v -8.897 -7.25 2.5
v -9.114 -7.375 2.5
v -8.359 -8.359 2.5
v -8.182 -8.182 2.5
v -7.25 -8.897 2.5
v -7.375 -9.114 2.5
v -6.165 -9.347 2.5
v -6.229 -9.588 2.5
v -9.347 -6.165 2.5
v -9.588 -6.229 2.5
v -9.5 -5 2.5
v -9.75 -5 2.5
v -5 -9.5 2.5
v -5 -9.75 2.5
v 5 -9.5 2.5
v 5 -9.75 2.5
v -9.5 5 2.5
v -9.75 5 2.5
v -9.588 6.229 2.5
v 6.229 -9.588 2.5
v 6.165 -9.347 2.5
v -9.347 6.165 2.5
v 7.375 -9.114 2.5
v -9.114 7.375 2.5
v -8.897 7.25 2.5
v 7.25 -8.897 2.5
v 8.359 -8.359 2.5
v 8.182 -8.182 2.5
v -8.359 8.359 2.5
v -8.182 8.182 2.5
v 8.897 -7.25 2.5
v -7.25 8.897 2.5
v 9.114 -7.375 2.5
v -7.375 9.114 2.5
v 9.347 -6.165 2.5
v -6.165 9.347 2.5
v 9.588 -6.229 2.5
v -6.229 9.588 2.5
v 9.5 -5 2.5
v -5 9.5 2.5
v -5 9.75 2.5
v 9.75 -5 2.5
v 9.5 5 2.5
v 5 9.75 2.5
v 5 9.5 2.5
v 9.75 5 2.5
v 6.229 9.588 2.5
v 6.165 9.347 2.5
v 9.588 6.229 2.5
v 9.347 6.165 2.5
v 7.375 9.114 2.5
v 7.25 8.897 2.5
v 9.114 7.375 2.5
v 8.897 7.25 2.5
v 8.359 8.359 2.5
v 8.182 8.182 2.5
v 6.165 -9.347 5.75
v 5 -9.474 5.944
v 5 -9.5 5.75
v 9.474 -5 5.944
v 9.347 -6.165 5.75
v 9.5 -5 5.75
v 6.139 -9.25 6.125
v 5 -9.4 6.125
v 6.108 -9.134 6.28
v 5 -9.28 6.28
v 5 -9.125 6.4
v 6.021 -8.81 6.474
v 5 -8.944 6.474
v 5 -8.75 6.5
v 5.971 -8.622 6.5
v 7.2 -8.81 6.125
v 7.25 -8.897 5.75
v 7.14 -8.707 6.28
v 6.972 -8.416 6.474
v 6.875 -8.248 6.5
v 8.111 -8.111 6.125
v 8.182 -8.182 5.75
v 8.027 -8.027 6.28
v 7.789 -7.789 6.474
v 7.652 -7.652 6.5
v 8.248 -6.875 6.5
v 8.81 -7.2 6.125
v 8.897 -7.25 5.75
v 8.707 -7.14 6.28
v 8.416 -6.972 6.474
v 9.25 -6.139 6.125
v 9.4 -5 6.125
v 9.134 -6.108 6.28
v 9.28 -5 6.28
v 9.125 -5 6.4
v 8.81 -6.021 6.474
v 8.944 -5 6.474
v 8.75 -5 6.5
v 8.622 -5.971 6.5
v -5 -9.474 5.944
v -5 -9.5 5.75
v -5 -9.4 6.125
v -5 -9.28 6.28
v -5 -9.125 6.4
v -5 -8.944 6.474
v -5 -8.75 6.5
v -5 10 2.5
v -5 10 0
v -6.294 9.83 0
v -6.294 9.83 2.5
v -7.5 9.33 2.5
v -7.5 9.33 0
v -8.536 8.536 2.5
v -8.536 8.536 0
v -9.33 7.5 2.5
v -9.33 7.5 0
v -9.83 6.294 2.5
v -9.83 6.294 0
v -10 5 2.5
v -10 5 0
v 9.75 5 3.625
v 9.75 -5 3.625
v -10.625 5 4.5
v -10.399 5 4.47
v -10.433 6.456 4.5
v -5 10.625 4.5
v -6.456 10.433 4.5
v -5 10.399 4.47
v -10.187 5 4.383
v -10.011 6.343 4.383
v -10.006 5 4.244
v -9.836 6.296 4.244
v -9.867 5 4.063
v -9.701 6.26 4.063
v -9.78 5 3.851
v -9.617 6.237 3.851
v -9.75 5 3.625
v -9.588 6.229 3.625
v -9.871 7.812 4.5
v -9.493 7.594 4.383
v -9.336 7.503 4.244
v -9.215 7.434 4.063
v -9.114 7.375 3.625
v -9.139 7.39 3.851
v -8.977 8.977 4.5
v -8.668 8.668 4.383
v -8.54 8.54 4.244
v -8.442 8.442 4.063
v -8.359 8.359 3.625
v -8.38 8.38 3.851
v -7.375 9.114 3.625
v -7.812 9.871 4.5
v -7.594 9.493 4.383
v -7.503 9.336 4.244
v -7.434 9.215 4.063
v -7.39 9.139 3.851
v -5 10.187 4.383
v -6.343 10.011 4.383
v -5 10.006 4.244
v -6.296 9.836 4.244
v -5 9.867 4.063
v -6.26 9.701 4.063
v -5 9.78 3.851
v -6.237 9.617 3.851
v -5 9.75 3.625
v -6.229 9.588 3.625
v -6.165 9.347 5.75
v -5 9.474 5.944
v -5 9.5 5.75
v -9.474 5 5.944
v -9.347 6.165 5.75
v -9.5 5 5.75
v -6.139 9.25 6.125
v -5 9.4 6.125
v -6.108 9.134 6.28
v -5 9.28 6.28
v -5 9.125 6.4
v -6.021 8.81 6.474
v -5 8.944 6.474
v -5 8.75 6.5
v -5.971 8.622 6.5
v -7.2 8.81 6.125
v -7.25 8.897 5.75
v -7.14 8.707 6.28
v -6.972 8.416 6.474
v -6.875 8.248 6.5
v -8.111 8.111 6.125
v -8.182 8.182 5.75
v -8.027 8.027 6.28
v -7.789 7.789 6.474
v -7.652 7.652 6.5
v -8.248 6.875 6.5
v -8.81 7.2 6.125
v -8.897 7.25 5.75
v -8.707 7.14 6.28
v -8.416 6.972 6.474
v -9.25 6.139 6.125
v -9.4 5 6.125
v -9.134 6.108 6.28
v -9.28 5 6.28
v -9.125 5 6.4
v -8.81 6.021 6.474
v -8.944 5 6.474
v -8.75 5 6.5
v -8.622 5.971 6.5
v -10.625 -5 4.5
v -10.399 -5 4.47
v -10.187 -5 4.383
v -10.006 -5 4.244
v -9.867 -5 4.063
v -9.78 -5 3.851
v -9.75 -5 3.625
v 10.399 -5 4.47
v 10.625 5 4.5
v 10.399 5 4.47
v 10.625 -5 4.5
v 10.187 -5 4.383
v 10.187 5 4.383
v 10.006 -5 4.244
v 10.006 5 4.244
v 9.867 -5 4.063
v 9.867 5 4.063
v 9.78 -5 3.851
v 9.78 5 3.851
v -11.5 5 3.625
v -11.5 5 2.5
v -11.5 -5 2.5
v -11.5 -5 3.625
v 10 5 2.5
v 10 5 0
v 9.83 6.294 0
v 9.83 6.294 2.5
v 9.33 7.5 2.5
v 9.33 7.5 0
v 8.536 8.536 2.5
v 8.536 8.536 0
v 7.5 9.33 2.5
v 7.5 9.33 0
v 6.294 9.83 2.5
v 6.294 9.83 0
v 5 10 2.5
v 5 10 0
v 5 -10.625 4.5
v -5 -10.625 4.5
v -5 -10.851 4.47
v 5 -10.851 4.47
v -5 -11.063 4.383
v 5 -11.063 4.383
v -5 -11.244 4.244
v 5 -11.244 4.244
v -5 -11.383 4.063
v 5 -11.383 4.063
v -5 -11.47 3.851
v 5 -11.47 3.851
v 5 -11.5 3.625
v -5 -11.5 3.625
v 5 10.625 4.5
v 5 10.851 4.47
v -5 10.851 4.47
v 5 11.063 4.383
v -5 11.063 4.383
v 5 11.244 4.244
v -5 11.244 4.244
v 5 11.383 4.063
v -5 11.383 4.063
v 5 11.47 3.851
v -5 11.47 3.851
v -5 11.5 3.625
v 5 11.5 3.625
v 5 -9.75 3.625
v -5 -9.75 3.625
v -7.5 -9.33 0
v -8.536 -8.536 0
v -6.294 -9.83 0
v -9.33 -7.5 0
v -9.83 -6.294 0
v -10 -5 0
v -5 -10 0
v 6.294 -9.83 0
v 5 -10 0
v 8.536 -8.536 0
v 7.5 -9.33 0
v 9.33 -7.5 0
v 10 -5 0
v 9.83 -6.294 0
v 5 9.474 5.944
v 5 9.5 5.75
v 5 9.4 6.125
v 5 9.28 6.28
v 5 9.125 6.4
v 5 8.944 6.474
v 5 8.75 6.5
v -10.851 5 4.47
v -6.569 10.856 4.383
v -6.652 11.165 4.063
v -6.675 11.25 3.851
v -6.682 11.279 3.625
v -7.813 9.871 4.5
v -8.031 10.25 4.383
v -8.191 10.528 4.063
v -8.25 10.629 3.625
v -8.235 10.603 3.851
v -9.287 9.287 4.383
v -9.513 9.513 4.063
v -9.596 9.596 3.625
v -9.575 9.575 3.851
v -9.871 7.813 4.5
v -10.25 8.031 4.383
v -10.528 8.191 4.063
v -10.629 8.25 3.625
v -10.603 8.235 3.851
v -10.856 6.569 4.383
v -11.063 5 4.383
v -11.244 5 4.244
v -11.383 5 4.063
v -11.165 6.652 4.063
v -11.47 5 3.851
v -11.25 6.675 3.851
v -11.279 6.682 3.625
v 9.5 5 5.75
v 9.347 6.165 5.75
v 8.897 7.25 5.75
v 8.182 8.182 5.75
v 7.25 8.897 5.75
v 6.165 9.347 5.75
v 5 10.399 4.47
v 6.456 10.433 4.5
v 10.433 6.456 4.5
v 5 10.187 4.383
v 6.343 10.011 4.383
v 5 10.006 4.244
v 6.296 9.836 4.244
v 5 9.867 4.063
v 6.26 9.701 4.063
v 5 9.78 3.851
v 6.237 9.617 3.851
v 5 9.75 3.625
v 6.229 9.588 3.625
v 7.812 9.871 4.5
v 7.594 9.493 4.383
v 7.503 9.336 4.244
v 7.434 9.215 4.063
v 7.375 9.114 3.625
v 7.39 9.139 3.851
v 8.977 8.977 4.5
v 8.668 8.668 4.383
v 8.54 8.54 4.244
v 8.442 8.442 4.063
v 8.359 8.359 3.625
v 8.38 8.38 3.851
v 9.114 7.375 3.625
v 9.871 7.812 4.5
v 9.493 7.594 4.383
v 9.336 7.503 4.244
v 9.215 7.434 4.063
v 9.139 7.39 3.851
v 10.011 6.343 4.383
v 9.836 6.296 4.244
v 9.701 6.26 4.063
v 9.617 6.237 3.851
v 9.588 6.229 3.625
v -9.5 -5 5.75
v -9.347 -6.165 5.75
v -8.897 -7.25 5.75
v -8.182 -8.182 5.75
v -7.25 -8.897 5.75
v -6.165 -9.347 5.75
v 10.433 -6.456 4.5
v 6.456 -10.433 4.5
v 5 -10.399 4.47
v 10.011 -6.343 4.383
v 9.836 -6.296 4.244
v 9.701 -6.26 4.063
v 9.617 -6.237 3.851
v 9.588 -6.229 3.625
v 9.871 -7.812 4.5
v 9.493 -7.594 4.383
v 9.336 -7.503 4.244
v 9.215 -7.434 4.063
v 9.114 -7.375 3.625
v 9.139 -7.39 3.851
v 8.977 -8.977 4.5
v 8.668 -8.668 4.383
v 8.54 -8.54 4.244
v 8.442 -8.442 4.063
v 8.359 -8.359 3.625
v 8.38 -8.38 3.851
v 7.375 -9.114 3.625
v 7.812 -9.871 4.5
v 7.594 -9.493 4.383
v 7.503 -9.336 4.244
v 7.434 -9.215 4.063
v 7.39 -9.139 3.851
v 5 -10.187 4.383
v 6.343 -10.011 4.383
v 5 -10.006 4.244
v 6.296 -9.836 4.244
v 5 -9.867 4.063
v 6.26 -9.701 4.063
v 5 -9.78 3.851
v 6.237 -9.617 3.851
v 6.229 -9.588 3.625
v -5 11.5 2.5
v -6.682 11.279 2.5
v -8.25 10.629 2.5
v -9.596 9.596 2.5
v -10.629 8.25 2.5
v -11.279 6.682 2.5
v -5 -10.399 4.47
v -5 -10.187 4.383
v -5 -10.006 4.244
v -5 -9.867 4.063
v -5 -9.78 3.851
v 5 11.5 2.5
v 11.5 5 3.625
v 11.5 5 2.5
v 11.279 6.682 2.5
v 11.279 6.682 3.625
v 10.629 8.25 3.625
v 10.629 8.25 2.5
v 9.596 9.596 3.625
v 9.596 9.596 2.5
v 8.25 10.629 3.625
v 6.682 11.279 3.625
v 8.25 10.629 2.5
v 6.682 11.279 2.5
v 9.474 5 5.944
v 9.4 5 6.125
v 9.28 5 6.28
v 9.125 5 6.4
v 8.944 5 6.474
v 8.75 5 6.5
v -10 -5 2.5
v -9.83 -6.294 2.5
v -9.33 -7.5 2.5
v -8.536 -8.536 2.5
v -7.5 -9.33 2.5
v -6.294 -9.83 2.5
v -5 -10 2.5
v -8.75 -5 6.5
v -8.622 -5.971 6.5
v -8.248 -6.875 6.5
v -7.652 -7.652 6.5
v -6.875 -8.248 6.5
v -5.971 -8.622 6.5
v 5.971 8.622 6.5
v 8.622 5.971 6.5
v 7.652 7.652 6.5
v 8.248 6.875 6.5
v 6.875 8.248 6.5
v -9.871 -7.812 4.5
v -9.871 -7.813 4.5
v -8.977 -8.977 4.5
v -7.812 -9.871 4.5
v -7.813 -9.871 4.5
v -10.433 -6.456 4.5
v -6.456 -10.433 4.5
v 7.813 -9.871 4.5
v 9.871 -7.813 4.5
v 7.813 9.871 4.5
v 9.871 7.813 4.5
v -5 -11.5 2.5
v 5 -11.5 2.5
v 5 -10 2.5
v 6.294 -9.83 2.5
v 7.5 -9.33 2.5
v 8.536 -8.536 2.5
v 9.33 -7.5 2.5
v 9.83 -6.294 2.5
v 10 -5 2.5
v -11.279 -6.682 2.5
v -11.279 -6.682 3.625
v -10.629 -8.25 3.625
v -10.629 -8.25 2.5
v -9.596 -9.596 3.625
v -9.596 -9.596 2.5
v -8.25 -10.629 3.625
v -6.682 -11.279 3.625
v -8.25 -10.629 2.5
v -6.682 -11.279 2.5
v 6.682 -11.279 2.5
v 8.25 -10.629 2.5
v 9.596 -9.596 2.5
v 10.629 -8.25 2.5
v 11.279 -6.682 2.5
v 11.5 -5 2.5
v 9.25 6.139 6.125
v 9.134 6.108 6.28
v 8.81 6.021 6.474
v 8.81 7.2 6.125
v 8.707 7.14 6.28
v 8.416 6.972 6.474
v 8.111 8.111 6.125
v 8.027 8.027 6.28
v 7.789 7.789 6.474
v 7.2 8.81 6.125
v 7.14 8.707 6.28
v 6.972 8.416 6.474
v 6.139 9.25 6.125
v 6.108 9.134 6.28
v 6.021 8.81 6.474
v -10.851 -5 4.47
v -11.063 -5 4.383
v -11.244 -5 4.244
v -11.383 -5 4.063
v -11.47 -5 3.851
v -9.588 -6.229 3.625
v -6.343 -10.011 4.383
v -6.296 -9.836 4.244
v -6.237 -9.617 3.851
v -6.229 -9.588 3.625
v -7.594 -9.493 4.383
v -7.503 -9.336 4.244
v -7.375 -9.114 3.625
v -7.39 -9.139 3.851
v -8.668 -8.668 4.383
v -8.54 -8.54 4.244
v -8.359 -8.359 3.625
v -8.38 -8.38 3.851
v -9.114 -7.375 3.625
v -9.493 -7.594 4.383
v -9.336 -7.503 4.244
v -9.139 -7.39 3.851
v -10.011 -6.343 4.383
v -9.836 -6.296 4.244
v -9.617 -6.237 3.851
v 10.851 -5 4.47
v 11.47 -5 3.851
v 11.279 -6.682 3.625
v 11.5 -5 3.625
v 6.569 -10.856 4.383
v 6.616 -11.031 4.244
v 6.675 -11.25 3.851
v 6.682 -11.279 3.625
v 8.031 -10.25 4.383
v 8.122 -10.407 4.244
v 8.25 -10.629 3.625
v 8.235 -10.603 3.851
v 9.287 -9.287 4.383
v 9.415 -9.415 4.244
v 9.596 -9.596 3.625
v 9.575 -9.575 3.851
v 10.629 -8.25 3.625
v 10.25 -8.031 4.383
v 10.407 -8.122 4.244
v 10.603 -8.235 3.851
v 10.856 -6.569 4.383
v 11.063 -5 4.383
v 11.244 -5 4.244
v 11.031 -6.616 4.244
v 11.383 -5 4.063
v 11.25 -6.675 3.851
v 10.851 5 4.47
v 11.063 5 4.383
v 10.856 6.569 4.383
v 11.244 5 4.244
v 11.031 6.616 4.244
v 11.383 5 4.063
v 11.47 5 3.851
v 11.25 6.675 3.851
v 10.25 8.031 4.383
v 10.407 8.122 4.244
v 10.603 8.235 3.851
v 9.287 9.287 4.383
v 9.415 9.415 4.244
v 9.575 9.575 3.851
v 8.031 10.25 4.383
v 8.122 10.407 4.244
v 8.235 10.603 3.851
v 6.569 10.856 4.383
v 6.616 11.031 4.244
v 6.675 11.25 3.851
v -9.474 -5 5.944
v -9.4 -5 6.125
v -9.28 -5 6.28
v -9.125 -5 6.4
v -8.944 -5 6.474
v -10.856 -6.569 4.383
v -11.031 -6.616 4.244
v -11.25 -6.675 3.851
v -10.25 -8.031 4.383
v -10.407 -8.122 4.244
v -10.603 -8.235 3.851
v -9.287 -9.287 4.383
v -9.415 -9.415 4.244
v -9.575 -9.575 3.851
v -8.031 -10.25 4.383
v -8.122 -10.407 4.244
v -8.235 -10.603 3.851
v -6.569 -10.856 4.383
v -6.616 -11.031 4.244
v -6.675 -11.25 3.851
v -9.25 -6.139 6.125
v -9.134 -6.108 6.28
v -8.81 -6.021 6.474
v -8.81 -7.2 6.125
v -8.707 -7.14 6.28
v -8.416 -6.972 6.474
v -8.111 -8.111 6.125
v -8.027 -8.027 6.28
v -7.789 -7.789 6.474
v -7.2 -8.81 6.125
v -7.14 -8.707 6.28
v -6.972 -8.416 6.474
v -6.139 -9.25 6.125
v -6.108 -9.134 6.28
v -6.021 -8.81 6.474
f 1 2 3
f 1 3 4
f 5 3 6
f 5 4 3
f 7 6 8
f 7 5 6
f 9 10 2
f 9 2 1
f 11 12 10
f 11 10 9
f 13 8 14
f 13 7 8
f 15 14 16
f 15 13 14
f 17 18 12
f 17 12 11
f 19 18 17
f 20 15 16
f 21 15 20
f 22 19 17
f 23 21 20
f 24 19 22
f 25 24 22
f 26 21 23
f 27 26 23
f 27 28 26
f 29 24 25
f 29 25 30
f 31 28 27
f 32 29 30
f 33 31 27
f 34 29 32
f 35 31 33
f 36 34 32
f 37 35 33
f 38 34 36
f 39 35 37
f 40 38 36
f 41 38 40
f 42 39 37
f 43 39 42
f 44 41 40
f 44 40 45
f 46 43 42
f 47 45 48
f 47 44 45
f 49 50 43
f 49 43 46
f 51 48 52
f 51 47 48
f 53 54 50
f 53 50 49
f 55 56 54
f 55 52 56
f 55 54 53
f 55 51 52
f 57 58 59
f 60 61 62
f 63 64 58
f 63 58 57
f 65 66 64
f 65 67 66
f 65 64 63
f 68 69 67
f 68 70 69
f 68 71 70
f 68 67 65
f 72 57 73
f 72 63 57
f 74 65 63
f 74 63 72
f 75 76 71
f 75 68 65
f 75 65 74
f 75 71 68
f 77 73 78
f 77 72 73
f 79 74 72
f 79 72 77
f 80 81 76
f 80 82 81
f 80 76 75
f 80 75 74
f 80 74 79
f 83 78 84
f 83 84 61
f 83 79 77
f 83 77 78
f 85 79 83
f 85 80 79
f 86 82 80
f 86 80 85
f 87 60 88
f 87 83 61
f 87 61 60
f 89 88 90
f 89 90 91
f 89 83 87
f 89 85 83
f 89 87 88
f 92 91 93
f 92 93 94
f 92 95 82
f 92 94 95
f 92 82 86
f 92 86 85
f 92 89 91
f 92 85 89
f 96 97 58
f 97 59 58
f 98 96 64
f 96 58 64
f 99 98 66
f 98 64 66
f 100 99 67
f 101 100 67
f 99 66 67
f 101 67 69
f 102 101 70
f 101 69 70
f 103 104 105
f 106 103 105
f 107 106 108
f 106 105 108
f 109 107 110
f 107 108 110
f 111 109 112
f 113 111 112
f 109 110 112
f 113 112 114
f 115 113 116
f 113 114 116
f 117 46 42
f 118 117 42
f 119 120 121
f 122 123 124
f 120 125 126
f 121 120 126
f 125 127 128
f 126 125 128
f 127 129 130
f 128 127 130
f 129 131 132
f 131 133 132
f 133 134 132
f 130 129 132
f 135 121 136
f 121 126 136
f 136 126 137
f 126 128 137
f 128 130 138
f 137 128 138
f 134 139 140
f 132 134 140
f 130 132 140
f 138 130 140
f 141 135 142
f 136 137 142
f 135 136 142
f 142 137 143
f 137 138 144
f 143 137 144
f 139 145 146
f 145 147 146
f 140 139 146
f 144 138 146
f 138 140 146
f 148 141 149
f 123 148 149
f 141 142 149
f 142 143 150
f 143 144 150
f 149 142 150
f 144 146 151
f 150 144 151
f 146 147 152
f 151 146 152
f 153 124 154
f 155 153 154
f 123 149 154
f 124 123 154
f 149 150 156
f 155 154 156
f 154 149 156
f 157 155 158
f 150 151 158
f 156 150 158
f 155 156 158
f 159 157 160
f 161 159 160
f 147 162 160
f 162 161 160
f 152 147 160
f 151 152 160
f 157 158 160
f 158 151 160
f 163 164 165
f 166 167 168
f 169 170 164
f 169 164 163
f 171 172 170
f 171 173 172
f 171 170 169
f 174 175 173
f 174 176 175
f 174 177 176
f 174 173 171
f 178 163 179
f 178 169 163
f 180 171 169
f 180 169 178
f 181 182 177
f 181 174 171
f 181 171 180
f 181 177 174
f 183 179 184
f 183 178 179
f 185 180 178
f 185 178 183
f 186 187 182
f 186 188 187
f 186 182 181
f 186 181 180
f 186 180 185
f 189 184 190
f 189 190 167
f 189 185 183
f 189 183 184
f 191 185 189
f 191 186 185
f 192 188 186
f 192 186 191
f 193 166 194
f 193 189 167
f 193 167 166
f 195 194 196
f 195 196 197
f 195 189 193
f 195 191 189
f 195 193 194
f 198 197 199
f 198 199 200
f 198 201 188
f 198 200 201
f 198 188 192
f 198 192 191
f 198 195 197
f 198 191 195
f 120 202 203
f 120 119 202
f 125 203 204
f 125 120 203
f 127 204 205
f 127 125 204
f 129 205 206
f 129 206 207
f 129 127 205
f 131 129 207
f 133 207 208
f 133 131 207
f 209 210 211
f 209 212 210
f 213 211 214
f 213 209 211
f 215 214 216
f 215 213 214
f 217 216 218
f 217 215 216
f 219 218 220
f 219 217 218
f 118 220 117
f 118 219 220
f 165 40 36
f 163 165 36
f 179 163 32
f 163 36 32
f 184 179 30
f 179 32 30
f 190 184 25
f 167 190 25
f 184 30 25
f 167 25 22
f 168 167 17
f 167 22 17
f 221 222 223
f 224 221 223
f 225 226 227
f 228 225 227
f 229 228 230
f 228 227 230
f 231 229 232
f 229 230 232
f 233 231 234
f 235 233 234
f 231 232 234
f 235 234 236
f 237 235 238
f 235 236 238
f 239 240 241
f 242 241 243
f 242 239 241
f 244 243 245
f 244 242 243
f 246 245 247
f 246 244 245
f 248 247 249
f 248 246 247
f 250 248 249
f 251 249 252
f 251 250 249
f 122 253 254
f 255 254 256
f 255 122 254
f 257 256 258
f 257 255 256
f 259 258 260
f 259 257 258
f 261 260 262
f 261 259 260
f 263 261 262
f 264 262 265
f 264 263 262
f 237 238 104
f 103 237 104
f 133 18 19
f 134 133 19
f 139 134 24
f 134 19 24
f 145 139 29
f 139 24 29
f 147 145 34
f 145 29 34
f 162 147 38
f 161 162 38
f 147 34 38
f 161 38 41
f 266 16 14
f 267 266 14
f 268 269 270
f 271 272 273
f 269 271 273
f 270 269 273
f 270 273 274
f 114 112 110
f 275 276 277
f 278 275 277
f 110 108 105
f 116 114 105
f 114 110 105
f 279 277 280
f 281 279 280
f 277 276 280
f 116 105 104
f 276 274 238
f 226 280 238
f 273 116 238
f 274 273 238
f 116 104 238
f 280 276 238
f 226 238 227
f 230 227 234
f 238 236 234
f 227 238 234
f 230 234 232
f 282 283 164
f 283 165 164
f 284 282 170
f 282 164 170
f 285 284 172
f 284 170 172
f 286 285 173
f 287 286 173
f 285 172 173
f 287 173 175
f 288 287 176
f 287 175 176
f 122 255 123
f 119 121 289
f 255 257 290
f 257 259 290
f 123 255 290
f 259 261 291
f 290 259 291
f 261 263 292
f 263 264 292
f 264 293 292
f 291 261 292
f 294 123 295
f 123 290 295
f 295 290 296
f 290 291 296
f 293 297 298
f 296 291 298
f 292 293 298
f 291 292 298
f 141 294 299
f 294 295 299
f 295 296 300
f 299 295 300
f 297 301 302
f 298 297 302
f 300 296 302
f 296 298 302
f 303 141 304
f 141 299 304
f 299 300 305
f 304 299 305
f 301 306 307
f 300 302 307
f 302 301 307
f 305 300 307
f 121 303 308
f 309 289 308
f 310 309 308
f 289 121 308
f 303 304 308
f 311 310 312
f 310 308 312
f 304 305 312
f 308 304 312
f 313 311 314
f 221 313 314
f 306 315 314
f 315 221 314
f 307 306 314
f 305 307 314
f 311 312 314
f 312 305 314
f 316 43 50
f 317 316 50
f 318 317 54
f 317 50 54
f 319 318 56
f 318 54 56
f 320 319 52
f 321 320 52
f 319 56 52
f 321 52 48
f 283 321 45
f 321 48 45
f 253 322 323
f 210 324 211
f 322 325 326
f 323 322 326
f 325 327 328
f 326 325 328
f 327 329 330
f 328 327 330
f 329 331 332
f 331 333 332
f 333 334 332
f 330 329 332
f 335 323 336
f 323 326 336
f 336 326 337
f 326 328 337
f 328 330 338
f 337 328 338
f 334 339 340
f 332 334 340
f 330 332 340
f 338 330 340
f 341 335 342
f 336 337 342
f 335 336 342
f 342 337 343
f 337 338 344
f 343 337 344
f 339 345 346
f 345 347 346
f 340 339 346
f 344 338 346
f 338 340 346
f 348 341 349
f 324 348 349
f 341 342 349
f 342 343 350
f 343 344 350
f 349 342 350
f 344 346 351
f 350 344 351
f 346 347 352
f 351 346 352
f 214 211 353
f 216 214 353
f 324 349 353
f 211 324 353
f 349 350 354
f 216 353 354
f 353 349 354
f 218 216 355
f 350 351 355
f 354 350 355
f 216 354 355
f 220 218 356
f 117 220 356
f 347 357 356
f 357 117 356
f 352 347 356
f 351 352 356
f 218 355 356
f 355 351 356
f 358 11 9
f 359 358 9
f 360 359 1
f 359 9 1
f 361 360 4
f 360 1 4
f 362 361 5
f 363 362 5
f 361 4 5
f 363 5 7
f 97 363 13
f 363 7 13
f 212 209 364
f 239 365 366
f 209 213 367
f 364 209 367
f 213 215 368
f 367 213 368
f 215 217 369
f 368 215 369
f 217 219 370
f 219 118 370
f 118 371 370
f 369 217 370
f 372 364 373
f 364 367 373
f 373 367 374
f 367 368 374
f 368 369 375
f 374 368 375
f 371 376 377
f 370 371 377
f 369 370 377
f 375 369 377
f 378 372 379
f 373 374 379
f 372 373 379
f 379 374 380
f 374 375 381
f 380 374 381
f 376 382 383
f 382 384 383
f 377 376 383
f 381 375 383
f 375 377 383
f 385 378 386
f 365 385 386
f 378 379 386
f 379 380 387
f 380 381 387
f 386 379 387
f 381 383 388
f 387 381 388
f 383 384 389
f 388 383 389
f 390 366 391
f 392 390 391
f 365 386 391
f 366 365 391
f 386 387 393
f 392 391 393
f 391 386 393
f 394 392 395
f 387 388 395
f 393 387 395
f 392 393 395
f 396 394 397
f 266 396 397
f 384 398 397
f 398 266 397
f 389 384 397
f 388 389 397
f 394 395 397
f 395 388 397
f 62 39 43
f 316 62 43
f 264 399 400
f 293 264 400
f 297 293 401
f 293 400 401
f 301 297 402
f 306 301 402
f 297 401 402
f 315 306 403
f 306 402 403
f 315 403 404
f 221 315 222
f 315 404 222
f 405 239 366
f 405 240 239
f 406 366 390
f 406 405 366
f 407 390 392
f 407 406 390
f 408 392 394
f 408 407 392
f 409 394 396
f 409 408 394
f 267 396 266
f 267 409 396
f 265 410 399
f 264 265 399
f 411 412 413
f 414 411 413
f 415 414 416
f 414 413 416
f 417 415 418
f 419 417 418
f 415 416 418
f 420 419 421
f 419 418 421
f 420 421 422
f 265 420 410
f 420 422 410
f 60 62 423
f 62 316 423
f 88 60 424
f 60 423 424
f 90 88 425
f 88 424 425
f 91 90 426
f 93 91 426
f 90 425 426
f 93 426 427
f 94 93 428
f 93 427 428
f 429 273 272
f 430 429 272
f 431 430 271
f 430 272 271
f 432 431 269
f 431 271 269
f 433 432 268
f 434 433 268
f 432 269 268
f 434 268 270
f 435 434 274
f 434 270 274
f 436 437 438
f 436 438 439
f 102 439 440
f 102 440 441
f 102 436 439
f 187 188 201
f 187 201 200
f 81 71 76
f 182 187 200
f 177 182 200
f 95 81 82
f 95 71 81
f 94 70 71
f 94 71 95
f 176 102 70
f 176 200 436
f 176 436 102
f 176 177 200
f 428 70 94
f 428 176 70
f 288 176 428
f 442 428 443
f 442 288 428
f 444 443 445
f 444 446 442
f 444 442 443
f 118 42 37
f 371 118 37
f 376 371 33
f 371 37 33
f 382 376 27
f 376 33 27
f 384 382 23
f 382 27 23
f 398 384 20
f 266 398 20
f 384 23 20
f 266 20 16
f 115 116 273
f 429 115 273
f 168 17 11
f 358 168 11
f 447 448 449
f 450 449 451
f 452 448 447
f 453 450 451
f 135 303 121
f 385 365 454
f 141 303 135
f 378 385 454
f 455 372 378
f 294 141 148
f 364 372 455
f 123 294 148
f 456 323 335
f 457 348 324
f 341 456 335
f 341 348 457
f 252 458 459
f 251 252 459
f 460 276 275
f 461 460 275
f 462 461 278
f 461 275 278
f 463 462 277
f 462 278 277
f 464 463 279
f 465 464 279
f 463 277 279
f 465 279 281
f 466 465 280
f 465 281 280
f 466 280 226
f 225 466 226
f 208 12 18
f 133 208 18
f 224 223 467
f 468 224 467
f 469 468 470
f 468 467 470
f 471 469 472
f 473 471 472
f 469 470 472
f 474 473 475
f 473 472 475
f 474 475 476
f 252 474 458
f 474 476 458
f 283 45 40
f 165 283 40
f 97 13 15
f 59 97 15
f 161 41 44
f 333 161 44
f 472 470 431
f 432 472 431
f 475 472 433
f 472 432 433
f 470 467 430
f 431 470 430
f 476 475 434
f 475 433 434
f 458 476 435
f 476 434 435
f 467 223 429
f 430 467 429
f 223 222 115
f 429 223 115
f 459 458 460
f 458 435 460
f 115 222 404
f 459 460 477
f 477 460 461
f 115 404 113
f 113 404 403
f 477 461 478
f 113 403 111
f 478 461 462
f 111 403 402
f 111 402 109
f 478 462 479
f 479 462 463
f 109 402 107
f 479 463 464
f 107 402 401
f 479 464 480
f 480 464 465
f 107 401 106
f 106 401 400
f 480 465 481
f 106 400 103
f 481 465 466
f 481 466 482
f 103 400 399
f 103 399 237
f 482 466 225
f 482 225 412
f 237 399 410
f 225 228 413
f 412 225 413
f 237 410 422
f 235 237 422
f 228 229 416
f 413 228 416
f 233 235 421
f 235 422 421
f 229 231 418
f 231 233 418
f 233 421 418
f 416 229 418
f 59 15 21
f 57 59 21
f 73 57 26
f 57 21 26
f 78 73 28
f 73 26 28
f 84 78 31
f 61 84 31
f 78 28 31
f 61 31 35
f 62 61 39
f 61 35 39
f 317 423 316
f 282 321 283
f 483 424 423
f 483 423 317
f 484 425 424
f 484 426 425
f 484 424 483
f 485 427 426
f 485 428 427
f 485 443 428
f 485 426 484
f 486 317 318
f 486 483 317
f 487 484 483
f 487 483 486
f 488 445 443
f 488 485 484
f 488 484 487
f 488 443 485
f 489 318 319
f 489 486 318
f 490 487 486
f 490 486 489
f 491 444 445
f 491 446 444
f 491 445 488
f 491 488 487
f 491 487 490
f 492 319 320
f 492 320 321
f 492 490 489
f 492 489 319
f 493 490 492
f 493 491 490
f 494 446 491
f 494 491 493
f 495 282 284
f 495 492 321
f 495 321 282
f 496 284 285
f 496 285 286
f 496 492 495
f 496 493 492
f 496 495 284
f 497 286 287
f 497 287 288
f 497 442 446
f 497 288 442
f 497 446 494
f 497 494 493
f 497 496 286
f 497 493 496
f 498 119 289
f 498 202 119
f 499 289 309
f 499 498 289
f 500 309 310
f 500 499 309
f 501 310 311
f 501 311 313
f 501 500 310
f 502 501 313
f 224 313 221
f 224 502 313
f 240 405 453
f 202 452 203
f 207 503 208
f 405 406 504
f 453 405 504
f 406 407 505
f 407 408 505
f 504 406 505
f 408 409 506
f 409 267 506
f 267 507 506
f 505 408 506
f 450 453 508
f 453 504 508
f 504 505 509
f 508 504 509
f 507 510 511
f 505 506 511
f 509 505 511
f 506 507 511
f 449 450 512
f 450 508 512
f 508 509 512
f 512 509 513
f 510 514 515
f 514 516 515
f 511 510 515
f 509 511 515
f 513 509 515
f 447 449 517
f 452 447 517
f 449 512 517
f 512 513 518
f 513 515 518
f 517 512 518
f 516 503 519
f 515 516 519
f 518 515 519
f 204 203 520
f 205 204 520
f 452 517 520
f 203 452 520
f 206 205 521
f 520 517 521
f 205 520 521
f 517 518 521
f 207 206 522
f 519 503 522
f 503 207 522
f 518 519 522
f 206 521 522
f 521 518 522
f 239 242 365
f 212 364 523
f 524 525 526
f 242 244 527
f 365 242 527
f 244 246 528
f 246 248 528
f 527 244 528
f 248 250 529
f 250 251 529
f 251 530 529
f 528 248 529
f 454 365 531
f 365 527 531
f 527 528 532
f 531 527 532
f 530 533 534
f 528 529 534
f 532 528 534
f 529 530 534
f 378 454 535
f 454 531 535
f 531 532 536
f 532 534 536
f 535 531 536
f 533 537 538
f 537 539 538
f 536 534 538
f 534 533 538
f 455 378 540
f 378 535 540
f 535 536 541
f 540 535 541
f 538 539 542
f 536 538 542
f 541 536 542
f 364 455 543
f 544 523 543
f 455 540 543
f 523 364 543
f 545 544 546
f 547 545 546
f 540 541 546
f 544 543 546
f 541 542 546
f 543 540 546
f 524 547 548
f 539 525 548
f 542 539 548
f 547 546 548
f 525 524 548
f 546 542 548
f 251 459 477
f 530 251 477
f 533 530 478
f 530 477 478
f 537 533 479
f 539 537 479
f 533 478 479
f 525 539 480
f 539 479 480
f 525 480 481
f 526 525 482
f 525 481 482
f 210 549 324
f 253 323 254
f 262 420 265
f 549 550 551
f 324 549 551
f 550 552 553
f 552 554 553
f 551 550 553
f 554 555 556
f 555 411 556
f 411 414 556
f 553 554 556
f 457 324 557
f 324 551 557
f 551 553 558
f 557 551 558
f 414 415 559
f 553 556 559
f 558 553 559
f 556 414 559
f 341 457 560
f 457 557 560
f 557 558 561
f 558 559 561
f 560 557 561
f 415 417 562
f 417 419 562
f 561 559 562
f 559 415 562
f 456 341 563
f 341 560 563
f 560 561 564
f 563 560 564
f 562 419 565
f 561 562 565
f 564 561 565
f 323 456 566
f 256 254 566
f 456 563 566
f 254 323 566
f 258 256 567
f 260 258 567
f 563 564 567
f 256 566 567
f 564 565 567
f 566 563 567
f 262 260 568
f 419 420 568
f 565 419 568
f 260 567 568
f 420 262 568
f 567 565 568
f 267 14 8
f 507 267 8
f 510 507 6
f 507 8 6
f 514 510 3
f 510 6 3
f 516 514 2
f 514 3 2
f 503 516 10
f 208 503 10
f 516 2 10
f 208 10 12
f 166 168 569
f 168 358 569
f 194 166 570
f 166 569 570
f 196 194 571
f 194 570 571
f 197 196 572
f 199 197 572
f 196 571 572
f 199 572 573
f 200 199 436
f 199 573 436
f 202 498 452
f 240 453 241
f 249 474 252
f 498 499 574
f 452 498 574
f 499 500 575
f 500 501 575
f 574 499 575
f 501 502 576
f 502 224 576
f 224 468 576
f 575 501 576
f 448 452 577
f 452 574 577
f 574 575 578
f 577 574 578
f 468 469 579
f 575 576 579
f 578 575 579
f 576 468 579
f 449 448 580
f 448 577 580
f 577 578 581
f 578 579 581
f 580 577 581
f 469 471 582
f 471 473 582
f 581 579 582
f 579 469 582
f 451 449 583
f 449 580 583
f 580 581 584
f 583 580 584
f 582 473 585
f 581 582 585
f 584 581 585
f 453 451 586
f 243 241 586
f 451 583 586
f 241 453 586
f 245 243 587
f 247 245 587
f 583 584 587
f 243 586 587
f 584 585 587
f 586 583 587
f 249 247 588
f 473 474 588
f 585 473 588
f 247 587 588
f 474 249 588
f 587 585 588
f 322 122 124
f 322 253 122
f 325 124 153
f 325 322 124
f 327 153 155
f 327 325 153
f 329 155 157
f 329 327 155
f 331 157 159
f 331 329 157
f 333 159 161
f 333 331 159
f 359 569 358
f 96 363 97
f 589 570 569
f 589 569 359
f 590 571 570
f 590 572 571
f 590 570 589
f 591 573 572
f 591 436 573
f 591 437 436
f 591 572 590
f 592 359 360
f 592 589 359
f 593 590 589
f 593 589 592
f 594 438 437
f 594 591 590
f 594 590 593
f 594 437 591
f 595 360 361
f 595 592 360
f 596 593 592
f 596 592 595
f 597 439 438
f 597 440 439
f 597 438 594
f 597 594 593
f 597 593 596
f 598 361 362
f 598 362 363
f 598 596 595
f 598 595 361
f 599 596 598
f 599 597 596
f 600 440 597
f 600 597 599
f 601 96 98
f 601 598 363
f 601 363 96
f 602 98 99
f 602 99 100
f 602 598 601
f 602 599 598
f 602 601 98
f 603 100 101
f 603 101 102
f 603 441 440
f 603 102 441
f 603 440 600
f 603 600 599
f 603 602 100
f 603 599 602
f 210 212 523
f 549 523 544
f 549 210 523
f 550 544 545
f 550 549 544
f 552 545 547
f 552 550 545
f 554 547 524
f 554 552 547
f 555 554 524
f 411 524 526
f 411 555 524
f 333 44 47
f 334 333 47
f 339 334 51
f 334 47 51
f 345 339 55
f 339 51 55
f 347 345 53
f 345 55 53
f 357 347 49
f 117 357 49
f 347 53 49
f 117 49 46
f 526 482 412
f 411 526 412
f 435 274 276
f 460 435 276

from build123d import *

# Parameters (mm, degrees)
F1_DEPTH = 2.5
F3_DEPTH = 2
F4_R     = 0.87499
F6_DEPTH = 4
F7_R     = 0.75


# Not quite as in the source:
# - a fillet or chamfer is up to 0.001 mm smaller than in the source, because OpenCascade refuses the exact size


with BuildPart() as f1:
    # F0 (on Top) → F1 (new body)
    with BuildSketch(Plane.XY):
        with BuildLine():
            Line((-5, -10), (5, -10))
            ThreePointArc((5, -10), (8.5355339059, -8.5355339059), (10, -5))
            Line((10, -5), (10, 5))
            ThreePointArc((10, 5), (8.5355339059, 8.5355339059), (5, 10))
            Line((5, 10), (-5, 10))
            ThreePointArc((-5, 10), (-8.5355339059, 8.5355339059), (-10, 5))
            Line((-10, 5), (-10, -5))
            ThreePointArc((-10, -5), (-8.5355339059, -8.5355339059), (-5, -10))
        make_face()
    extrude(amount=F1_DEPTH)

    # F2 (on face) → F3 (join)
    with BuildSketch(Plane.XY.offset(2.5)):
        with BuildLine():
            Line((-5, -11.5), (5, -11.5))
            ThreePointArc((5, -11.5), (9.5961940777, -9.5961940777), (11.5, -5))
            Line((11.5, -5), (11.5, 5))
            ThreePointArc((11.5, 5), (9.5961940777, 9.5961940777), (5, 11.5))
            Line((5, 11.5), (-5, 11.5))
            ThreePointArc((-5, 11.5), (-9.5961940777, 9.5961940777), (-11.5, 5))
            Line((-11.5, 5), (-11.5, -5))
            ThreePointArc((-11.5, -5), (-9.5961940777, -9.5961940777), (-5, -11.5))
        make_face()
        with BuildLine():
            ThreePointArc((9.75, -5), (8.3587572106, -8.3587572106), (5, -9.75))
            Line((5, -9.75), (-5, -9.75))
            ThreePointArc((-5, -9.75), (-8.3587572106, -8.3587572106), (-9.75, -5))
            Line((-9.75, -5), (-9.75, 5))
            ThreePointArc((-9.75, 5), (-8.3587572106, 8.3587572106), (-5, 9.75))
            Line((-5, 9.75), (5, 9.75))
            ThreePointArc((5, 9.75), (8.3587572106, 8.3587572106), (9.75, 5))
            Line((9.75, 5), (9.75, -5))
        make_face(mode=Mode.SUBTRACT)
    extrude(amount=F3_DEPTH)

    # F4 (radius 0.875 in the source; OpenCascade refuses exactly that, so slightly less here)
    f4_edges = [f1.edges().sort_by_distance(p)[0] for p in [
        (-9.75, 0, 4.5),
        (-11.5, 0, 4.5),
    ]]
    fillet(f4_edges, radius=F4_R)

    # F5 (on face) → F6 (join)
    with BuildSketch(Plane.XY.offset(2.5)):
        with BuildLine():
            ThreePointArc((9.5, 5), (8.1819805153, 8.1819805153), (5, 9.5))
            Line((5, 9.5), (-5, 9.5))
            ThreePointArc((-5, 9.5), (-8.1819805153, 8.1819805153), (-9.5, 5))
            Line((-9.5, 5), (-9.5, -5))
            ThreePointArc((-9.5, -5), (-8.1819805153, -8.1819805153), (-5, -9.5))
            Line((-5, -9.5), (5, -9.5))
            ThreePointArc((5, -9.5), (8.1819805153, -8.1819805153), (9.5, -5))
            Line((9.5, -5), (9.5, 5))
        make_face()
    extrude(amount=F6_DEPTH)

    # F7
    f7_edges = [f1.edges().sort_by_distance(p)[0] for p in [
        (0, -9.5, 6.5),
    ]]
    fillet(f7_edges, radius=F7_R)


solid = f1.part
